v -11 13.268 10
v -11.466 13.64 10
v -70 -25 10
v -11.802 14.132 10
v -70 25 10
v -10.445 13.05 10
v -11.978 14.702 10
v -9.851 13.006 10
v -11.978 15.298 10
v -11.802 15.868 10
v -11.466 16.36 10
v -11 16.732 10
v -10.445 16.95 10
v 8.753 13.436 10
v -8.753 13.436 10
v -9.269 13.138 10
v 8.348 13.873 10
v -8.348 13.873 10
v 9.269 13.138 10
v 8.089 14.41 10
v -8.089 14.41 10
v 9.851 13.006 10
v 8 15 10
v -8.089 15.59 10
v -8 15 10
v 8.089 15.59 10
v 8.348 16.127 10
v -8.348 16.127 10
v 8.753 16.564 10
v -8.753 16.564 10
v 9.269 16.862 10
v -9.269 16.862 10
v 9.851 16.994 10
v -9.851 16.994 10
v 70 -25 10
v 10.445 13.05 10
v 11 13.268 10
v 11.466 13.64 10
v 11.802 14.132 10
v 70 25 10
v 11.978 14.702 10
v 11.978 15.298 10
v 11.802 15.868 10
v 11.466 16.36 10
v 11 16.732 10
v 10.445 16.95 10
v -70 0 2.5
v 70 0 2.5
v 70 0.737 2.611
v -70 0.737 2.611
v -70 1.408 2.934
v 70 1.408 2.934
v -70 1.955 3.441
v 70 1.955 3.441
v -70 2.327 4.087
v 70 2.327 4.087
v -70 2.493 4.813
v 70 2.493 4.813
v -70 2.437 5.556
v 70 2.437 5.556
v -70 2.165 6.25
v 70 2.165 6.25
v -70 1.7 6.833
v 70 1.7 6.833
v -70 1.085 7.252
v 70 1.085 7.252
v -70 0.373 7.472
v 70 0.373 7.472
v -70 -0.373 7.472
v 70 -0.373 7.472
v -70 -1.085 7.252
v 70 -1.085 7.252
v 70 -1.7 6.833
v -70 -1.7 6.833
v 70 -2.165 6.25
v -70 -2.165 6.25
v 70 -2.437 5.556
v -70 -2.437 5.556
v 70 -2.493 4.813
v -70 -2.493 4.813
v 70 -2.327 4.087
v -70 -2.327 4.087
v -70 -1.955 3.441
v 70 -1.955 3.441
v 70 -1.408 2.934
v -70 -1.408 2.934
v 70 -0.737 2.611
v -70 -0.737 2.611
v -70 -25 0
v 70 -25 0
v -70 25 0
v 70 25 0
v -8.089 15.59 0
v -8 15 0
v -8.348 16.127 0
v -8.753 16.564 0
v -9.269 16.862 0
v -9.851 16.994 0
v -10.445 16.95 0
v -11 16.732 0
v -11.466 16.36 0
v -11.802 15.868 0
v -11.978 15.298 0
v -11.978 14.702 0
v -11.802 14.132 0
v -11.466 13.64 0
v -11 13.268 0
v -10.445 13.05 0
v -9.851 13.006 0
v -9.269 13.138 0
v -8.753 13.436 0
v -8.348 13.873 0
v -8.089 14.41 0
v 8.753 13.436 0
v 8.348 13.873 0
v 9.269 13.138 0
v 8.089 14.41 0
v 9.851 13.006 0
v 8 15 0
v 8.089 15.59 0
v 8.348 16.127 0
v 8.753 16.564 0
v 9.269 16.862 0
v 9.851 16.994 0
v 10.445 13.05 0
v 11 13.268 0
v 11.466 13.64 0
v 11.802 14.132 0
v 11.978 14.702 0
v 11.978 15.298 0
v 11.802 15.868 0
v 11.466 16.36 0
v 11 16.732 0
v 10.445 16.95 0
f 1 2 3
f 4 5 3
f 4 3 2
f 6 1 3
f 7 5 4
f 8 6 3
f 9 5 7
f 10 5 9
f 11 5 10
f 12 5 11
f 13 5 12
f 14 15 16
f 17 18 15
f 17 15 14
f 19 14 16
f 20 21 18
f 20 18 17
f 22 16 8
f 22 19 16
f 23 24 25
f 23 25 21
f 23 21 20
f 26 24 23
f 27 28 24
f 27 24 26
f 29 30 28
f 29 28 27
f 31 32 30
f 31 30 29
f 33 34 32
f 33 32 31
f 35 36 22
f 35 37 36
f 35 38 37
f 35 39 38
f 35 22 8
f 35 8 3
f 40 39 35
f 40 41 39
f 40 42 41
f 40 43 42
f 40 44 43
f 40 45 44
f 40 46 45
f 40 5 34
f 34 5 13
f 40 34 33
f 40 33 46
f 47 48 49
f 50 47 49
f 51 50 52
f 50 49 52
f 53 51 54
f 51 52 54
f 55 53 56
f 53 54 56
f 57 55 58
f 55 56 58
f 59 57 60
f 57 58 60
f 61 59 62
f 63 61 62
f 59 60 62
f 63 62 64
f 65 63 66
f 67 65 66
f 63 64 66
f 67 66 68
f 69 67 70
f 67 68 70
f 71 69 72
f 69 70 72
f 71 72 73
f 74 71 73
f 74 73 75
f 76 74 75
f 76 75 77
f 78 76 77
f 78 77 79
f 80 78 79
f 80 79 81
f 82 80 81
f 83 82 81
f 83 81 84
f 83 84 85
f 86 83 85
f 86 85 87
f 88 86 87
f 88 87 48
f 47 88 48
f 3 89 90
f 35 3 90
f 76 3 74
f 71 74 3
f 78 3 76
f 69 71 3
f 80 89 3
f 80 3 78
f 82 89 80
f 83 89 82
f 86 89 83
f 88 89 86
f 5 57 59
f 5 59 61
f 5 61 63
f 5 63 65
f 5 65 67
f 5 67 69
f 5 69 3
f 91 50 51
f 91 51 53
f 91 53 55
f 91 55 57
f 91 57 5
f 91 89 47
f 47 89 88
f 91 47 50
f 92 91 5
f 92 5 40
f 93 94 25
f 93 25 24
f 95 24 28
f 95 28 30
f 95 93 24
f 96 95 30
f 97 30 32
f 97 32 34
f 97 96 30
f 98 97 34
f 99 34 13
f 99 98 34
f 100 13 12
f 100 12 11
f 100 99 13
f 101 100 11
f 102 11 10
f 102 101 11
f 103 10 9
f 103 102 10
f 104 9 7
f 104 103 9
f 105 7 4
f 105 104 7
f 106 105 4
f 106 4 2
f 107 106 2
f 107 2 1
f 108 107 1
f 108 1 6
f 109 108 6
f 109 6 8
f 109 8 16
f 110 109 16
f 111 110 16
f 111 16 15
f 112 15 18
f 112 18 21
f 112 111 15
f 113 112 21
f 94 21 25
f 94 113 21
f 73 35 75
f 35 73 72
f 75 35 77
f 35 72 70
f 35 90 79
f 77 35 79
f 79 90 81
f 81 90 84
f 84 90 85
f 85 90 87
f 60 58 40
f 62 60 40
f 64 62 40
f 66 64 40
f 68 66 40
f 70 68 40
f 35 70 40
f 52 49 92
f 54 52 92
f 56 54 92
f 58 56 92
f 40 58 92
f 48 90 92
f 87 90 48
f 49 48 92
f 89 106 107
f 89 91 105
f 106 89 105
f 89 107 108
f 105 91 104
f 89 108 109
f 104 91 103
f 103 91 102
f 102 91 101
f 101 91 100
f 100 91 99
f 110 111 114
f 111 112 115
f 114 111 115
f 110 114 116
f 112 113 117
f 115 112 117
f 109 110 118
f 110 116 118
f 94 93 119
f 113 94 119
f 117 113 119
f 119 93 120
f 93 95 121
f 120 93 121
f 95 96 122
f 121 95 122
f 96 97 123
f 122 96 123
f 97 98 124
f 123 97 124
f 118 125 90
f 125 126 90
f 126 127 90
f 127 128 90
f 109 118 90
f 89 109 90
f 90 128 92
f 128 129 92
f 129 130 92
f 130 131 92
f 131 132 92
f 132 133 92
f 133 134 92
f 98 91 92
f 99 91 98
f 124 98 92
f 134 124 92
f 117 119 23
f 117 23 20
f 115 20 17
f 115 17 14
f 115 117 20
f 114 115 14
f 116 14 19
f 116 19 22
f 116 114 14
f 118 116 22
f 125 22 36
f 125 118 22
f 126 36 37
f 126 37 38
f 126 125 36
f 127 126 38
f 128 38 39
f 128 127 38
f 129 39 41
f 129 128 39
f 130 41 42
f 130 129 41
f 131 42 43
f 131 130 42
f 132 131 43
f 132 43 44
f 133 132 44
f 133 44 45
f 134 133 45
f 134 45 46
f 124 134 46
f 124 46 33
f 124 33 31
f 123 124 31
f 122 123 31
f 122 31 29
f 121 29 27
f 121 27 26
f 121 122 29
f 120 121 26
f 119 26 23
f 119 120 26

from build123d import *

# Parameters (mm, degrees)
SKETCH1_W           = 140
SKETCH1_H           = 50
SKETCH1_R           = 2
BOSS_EXTRUDE1_DEPTH = 10
SKETCH2_R           = 2.5
CUT_EXTRUDE1_DEPTH  = 153


with BuildPart() as part:
    # Sketch1 → Boss-Extrude1 (new body)
    with BuildSketch(Plane.XY):
        Rectangle(SKETCH1_W, SKETCH1_H)
        with Locations((-10, 15)):
            Circle(SKETCH1_R, mode=Mode.SUBTRACT)
        with Locations(Location((10, 15, 0), (0, 0, 180))):
            Circle(SKETCH1_R, mode=Mode.SUBTRACT)
    extrude(amount=BOSS_EXTRUDE1_DEPTH)

    # Sketch2 → Cut-Extrude1 (cut)
    with BuildSketch(Plane(origin=(70, 0, 0), x_dir=(0, 0, -1), z_dir=(1, 0, 0))):
        with Locations((-5, 0)):
            Circle(SKETCH2_R)
    extrude(amount=-CUT_EXTRUDE1_DEPTH, mode=Mode.SUBTRACT)


solid = part.part
